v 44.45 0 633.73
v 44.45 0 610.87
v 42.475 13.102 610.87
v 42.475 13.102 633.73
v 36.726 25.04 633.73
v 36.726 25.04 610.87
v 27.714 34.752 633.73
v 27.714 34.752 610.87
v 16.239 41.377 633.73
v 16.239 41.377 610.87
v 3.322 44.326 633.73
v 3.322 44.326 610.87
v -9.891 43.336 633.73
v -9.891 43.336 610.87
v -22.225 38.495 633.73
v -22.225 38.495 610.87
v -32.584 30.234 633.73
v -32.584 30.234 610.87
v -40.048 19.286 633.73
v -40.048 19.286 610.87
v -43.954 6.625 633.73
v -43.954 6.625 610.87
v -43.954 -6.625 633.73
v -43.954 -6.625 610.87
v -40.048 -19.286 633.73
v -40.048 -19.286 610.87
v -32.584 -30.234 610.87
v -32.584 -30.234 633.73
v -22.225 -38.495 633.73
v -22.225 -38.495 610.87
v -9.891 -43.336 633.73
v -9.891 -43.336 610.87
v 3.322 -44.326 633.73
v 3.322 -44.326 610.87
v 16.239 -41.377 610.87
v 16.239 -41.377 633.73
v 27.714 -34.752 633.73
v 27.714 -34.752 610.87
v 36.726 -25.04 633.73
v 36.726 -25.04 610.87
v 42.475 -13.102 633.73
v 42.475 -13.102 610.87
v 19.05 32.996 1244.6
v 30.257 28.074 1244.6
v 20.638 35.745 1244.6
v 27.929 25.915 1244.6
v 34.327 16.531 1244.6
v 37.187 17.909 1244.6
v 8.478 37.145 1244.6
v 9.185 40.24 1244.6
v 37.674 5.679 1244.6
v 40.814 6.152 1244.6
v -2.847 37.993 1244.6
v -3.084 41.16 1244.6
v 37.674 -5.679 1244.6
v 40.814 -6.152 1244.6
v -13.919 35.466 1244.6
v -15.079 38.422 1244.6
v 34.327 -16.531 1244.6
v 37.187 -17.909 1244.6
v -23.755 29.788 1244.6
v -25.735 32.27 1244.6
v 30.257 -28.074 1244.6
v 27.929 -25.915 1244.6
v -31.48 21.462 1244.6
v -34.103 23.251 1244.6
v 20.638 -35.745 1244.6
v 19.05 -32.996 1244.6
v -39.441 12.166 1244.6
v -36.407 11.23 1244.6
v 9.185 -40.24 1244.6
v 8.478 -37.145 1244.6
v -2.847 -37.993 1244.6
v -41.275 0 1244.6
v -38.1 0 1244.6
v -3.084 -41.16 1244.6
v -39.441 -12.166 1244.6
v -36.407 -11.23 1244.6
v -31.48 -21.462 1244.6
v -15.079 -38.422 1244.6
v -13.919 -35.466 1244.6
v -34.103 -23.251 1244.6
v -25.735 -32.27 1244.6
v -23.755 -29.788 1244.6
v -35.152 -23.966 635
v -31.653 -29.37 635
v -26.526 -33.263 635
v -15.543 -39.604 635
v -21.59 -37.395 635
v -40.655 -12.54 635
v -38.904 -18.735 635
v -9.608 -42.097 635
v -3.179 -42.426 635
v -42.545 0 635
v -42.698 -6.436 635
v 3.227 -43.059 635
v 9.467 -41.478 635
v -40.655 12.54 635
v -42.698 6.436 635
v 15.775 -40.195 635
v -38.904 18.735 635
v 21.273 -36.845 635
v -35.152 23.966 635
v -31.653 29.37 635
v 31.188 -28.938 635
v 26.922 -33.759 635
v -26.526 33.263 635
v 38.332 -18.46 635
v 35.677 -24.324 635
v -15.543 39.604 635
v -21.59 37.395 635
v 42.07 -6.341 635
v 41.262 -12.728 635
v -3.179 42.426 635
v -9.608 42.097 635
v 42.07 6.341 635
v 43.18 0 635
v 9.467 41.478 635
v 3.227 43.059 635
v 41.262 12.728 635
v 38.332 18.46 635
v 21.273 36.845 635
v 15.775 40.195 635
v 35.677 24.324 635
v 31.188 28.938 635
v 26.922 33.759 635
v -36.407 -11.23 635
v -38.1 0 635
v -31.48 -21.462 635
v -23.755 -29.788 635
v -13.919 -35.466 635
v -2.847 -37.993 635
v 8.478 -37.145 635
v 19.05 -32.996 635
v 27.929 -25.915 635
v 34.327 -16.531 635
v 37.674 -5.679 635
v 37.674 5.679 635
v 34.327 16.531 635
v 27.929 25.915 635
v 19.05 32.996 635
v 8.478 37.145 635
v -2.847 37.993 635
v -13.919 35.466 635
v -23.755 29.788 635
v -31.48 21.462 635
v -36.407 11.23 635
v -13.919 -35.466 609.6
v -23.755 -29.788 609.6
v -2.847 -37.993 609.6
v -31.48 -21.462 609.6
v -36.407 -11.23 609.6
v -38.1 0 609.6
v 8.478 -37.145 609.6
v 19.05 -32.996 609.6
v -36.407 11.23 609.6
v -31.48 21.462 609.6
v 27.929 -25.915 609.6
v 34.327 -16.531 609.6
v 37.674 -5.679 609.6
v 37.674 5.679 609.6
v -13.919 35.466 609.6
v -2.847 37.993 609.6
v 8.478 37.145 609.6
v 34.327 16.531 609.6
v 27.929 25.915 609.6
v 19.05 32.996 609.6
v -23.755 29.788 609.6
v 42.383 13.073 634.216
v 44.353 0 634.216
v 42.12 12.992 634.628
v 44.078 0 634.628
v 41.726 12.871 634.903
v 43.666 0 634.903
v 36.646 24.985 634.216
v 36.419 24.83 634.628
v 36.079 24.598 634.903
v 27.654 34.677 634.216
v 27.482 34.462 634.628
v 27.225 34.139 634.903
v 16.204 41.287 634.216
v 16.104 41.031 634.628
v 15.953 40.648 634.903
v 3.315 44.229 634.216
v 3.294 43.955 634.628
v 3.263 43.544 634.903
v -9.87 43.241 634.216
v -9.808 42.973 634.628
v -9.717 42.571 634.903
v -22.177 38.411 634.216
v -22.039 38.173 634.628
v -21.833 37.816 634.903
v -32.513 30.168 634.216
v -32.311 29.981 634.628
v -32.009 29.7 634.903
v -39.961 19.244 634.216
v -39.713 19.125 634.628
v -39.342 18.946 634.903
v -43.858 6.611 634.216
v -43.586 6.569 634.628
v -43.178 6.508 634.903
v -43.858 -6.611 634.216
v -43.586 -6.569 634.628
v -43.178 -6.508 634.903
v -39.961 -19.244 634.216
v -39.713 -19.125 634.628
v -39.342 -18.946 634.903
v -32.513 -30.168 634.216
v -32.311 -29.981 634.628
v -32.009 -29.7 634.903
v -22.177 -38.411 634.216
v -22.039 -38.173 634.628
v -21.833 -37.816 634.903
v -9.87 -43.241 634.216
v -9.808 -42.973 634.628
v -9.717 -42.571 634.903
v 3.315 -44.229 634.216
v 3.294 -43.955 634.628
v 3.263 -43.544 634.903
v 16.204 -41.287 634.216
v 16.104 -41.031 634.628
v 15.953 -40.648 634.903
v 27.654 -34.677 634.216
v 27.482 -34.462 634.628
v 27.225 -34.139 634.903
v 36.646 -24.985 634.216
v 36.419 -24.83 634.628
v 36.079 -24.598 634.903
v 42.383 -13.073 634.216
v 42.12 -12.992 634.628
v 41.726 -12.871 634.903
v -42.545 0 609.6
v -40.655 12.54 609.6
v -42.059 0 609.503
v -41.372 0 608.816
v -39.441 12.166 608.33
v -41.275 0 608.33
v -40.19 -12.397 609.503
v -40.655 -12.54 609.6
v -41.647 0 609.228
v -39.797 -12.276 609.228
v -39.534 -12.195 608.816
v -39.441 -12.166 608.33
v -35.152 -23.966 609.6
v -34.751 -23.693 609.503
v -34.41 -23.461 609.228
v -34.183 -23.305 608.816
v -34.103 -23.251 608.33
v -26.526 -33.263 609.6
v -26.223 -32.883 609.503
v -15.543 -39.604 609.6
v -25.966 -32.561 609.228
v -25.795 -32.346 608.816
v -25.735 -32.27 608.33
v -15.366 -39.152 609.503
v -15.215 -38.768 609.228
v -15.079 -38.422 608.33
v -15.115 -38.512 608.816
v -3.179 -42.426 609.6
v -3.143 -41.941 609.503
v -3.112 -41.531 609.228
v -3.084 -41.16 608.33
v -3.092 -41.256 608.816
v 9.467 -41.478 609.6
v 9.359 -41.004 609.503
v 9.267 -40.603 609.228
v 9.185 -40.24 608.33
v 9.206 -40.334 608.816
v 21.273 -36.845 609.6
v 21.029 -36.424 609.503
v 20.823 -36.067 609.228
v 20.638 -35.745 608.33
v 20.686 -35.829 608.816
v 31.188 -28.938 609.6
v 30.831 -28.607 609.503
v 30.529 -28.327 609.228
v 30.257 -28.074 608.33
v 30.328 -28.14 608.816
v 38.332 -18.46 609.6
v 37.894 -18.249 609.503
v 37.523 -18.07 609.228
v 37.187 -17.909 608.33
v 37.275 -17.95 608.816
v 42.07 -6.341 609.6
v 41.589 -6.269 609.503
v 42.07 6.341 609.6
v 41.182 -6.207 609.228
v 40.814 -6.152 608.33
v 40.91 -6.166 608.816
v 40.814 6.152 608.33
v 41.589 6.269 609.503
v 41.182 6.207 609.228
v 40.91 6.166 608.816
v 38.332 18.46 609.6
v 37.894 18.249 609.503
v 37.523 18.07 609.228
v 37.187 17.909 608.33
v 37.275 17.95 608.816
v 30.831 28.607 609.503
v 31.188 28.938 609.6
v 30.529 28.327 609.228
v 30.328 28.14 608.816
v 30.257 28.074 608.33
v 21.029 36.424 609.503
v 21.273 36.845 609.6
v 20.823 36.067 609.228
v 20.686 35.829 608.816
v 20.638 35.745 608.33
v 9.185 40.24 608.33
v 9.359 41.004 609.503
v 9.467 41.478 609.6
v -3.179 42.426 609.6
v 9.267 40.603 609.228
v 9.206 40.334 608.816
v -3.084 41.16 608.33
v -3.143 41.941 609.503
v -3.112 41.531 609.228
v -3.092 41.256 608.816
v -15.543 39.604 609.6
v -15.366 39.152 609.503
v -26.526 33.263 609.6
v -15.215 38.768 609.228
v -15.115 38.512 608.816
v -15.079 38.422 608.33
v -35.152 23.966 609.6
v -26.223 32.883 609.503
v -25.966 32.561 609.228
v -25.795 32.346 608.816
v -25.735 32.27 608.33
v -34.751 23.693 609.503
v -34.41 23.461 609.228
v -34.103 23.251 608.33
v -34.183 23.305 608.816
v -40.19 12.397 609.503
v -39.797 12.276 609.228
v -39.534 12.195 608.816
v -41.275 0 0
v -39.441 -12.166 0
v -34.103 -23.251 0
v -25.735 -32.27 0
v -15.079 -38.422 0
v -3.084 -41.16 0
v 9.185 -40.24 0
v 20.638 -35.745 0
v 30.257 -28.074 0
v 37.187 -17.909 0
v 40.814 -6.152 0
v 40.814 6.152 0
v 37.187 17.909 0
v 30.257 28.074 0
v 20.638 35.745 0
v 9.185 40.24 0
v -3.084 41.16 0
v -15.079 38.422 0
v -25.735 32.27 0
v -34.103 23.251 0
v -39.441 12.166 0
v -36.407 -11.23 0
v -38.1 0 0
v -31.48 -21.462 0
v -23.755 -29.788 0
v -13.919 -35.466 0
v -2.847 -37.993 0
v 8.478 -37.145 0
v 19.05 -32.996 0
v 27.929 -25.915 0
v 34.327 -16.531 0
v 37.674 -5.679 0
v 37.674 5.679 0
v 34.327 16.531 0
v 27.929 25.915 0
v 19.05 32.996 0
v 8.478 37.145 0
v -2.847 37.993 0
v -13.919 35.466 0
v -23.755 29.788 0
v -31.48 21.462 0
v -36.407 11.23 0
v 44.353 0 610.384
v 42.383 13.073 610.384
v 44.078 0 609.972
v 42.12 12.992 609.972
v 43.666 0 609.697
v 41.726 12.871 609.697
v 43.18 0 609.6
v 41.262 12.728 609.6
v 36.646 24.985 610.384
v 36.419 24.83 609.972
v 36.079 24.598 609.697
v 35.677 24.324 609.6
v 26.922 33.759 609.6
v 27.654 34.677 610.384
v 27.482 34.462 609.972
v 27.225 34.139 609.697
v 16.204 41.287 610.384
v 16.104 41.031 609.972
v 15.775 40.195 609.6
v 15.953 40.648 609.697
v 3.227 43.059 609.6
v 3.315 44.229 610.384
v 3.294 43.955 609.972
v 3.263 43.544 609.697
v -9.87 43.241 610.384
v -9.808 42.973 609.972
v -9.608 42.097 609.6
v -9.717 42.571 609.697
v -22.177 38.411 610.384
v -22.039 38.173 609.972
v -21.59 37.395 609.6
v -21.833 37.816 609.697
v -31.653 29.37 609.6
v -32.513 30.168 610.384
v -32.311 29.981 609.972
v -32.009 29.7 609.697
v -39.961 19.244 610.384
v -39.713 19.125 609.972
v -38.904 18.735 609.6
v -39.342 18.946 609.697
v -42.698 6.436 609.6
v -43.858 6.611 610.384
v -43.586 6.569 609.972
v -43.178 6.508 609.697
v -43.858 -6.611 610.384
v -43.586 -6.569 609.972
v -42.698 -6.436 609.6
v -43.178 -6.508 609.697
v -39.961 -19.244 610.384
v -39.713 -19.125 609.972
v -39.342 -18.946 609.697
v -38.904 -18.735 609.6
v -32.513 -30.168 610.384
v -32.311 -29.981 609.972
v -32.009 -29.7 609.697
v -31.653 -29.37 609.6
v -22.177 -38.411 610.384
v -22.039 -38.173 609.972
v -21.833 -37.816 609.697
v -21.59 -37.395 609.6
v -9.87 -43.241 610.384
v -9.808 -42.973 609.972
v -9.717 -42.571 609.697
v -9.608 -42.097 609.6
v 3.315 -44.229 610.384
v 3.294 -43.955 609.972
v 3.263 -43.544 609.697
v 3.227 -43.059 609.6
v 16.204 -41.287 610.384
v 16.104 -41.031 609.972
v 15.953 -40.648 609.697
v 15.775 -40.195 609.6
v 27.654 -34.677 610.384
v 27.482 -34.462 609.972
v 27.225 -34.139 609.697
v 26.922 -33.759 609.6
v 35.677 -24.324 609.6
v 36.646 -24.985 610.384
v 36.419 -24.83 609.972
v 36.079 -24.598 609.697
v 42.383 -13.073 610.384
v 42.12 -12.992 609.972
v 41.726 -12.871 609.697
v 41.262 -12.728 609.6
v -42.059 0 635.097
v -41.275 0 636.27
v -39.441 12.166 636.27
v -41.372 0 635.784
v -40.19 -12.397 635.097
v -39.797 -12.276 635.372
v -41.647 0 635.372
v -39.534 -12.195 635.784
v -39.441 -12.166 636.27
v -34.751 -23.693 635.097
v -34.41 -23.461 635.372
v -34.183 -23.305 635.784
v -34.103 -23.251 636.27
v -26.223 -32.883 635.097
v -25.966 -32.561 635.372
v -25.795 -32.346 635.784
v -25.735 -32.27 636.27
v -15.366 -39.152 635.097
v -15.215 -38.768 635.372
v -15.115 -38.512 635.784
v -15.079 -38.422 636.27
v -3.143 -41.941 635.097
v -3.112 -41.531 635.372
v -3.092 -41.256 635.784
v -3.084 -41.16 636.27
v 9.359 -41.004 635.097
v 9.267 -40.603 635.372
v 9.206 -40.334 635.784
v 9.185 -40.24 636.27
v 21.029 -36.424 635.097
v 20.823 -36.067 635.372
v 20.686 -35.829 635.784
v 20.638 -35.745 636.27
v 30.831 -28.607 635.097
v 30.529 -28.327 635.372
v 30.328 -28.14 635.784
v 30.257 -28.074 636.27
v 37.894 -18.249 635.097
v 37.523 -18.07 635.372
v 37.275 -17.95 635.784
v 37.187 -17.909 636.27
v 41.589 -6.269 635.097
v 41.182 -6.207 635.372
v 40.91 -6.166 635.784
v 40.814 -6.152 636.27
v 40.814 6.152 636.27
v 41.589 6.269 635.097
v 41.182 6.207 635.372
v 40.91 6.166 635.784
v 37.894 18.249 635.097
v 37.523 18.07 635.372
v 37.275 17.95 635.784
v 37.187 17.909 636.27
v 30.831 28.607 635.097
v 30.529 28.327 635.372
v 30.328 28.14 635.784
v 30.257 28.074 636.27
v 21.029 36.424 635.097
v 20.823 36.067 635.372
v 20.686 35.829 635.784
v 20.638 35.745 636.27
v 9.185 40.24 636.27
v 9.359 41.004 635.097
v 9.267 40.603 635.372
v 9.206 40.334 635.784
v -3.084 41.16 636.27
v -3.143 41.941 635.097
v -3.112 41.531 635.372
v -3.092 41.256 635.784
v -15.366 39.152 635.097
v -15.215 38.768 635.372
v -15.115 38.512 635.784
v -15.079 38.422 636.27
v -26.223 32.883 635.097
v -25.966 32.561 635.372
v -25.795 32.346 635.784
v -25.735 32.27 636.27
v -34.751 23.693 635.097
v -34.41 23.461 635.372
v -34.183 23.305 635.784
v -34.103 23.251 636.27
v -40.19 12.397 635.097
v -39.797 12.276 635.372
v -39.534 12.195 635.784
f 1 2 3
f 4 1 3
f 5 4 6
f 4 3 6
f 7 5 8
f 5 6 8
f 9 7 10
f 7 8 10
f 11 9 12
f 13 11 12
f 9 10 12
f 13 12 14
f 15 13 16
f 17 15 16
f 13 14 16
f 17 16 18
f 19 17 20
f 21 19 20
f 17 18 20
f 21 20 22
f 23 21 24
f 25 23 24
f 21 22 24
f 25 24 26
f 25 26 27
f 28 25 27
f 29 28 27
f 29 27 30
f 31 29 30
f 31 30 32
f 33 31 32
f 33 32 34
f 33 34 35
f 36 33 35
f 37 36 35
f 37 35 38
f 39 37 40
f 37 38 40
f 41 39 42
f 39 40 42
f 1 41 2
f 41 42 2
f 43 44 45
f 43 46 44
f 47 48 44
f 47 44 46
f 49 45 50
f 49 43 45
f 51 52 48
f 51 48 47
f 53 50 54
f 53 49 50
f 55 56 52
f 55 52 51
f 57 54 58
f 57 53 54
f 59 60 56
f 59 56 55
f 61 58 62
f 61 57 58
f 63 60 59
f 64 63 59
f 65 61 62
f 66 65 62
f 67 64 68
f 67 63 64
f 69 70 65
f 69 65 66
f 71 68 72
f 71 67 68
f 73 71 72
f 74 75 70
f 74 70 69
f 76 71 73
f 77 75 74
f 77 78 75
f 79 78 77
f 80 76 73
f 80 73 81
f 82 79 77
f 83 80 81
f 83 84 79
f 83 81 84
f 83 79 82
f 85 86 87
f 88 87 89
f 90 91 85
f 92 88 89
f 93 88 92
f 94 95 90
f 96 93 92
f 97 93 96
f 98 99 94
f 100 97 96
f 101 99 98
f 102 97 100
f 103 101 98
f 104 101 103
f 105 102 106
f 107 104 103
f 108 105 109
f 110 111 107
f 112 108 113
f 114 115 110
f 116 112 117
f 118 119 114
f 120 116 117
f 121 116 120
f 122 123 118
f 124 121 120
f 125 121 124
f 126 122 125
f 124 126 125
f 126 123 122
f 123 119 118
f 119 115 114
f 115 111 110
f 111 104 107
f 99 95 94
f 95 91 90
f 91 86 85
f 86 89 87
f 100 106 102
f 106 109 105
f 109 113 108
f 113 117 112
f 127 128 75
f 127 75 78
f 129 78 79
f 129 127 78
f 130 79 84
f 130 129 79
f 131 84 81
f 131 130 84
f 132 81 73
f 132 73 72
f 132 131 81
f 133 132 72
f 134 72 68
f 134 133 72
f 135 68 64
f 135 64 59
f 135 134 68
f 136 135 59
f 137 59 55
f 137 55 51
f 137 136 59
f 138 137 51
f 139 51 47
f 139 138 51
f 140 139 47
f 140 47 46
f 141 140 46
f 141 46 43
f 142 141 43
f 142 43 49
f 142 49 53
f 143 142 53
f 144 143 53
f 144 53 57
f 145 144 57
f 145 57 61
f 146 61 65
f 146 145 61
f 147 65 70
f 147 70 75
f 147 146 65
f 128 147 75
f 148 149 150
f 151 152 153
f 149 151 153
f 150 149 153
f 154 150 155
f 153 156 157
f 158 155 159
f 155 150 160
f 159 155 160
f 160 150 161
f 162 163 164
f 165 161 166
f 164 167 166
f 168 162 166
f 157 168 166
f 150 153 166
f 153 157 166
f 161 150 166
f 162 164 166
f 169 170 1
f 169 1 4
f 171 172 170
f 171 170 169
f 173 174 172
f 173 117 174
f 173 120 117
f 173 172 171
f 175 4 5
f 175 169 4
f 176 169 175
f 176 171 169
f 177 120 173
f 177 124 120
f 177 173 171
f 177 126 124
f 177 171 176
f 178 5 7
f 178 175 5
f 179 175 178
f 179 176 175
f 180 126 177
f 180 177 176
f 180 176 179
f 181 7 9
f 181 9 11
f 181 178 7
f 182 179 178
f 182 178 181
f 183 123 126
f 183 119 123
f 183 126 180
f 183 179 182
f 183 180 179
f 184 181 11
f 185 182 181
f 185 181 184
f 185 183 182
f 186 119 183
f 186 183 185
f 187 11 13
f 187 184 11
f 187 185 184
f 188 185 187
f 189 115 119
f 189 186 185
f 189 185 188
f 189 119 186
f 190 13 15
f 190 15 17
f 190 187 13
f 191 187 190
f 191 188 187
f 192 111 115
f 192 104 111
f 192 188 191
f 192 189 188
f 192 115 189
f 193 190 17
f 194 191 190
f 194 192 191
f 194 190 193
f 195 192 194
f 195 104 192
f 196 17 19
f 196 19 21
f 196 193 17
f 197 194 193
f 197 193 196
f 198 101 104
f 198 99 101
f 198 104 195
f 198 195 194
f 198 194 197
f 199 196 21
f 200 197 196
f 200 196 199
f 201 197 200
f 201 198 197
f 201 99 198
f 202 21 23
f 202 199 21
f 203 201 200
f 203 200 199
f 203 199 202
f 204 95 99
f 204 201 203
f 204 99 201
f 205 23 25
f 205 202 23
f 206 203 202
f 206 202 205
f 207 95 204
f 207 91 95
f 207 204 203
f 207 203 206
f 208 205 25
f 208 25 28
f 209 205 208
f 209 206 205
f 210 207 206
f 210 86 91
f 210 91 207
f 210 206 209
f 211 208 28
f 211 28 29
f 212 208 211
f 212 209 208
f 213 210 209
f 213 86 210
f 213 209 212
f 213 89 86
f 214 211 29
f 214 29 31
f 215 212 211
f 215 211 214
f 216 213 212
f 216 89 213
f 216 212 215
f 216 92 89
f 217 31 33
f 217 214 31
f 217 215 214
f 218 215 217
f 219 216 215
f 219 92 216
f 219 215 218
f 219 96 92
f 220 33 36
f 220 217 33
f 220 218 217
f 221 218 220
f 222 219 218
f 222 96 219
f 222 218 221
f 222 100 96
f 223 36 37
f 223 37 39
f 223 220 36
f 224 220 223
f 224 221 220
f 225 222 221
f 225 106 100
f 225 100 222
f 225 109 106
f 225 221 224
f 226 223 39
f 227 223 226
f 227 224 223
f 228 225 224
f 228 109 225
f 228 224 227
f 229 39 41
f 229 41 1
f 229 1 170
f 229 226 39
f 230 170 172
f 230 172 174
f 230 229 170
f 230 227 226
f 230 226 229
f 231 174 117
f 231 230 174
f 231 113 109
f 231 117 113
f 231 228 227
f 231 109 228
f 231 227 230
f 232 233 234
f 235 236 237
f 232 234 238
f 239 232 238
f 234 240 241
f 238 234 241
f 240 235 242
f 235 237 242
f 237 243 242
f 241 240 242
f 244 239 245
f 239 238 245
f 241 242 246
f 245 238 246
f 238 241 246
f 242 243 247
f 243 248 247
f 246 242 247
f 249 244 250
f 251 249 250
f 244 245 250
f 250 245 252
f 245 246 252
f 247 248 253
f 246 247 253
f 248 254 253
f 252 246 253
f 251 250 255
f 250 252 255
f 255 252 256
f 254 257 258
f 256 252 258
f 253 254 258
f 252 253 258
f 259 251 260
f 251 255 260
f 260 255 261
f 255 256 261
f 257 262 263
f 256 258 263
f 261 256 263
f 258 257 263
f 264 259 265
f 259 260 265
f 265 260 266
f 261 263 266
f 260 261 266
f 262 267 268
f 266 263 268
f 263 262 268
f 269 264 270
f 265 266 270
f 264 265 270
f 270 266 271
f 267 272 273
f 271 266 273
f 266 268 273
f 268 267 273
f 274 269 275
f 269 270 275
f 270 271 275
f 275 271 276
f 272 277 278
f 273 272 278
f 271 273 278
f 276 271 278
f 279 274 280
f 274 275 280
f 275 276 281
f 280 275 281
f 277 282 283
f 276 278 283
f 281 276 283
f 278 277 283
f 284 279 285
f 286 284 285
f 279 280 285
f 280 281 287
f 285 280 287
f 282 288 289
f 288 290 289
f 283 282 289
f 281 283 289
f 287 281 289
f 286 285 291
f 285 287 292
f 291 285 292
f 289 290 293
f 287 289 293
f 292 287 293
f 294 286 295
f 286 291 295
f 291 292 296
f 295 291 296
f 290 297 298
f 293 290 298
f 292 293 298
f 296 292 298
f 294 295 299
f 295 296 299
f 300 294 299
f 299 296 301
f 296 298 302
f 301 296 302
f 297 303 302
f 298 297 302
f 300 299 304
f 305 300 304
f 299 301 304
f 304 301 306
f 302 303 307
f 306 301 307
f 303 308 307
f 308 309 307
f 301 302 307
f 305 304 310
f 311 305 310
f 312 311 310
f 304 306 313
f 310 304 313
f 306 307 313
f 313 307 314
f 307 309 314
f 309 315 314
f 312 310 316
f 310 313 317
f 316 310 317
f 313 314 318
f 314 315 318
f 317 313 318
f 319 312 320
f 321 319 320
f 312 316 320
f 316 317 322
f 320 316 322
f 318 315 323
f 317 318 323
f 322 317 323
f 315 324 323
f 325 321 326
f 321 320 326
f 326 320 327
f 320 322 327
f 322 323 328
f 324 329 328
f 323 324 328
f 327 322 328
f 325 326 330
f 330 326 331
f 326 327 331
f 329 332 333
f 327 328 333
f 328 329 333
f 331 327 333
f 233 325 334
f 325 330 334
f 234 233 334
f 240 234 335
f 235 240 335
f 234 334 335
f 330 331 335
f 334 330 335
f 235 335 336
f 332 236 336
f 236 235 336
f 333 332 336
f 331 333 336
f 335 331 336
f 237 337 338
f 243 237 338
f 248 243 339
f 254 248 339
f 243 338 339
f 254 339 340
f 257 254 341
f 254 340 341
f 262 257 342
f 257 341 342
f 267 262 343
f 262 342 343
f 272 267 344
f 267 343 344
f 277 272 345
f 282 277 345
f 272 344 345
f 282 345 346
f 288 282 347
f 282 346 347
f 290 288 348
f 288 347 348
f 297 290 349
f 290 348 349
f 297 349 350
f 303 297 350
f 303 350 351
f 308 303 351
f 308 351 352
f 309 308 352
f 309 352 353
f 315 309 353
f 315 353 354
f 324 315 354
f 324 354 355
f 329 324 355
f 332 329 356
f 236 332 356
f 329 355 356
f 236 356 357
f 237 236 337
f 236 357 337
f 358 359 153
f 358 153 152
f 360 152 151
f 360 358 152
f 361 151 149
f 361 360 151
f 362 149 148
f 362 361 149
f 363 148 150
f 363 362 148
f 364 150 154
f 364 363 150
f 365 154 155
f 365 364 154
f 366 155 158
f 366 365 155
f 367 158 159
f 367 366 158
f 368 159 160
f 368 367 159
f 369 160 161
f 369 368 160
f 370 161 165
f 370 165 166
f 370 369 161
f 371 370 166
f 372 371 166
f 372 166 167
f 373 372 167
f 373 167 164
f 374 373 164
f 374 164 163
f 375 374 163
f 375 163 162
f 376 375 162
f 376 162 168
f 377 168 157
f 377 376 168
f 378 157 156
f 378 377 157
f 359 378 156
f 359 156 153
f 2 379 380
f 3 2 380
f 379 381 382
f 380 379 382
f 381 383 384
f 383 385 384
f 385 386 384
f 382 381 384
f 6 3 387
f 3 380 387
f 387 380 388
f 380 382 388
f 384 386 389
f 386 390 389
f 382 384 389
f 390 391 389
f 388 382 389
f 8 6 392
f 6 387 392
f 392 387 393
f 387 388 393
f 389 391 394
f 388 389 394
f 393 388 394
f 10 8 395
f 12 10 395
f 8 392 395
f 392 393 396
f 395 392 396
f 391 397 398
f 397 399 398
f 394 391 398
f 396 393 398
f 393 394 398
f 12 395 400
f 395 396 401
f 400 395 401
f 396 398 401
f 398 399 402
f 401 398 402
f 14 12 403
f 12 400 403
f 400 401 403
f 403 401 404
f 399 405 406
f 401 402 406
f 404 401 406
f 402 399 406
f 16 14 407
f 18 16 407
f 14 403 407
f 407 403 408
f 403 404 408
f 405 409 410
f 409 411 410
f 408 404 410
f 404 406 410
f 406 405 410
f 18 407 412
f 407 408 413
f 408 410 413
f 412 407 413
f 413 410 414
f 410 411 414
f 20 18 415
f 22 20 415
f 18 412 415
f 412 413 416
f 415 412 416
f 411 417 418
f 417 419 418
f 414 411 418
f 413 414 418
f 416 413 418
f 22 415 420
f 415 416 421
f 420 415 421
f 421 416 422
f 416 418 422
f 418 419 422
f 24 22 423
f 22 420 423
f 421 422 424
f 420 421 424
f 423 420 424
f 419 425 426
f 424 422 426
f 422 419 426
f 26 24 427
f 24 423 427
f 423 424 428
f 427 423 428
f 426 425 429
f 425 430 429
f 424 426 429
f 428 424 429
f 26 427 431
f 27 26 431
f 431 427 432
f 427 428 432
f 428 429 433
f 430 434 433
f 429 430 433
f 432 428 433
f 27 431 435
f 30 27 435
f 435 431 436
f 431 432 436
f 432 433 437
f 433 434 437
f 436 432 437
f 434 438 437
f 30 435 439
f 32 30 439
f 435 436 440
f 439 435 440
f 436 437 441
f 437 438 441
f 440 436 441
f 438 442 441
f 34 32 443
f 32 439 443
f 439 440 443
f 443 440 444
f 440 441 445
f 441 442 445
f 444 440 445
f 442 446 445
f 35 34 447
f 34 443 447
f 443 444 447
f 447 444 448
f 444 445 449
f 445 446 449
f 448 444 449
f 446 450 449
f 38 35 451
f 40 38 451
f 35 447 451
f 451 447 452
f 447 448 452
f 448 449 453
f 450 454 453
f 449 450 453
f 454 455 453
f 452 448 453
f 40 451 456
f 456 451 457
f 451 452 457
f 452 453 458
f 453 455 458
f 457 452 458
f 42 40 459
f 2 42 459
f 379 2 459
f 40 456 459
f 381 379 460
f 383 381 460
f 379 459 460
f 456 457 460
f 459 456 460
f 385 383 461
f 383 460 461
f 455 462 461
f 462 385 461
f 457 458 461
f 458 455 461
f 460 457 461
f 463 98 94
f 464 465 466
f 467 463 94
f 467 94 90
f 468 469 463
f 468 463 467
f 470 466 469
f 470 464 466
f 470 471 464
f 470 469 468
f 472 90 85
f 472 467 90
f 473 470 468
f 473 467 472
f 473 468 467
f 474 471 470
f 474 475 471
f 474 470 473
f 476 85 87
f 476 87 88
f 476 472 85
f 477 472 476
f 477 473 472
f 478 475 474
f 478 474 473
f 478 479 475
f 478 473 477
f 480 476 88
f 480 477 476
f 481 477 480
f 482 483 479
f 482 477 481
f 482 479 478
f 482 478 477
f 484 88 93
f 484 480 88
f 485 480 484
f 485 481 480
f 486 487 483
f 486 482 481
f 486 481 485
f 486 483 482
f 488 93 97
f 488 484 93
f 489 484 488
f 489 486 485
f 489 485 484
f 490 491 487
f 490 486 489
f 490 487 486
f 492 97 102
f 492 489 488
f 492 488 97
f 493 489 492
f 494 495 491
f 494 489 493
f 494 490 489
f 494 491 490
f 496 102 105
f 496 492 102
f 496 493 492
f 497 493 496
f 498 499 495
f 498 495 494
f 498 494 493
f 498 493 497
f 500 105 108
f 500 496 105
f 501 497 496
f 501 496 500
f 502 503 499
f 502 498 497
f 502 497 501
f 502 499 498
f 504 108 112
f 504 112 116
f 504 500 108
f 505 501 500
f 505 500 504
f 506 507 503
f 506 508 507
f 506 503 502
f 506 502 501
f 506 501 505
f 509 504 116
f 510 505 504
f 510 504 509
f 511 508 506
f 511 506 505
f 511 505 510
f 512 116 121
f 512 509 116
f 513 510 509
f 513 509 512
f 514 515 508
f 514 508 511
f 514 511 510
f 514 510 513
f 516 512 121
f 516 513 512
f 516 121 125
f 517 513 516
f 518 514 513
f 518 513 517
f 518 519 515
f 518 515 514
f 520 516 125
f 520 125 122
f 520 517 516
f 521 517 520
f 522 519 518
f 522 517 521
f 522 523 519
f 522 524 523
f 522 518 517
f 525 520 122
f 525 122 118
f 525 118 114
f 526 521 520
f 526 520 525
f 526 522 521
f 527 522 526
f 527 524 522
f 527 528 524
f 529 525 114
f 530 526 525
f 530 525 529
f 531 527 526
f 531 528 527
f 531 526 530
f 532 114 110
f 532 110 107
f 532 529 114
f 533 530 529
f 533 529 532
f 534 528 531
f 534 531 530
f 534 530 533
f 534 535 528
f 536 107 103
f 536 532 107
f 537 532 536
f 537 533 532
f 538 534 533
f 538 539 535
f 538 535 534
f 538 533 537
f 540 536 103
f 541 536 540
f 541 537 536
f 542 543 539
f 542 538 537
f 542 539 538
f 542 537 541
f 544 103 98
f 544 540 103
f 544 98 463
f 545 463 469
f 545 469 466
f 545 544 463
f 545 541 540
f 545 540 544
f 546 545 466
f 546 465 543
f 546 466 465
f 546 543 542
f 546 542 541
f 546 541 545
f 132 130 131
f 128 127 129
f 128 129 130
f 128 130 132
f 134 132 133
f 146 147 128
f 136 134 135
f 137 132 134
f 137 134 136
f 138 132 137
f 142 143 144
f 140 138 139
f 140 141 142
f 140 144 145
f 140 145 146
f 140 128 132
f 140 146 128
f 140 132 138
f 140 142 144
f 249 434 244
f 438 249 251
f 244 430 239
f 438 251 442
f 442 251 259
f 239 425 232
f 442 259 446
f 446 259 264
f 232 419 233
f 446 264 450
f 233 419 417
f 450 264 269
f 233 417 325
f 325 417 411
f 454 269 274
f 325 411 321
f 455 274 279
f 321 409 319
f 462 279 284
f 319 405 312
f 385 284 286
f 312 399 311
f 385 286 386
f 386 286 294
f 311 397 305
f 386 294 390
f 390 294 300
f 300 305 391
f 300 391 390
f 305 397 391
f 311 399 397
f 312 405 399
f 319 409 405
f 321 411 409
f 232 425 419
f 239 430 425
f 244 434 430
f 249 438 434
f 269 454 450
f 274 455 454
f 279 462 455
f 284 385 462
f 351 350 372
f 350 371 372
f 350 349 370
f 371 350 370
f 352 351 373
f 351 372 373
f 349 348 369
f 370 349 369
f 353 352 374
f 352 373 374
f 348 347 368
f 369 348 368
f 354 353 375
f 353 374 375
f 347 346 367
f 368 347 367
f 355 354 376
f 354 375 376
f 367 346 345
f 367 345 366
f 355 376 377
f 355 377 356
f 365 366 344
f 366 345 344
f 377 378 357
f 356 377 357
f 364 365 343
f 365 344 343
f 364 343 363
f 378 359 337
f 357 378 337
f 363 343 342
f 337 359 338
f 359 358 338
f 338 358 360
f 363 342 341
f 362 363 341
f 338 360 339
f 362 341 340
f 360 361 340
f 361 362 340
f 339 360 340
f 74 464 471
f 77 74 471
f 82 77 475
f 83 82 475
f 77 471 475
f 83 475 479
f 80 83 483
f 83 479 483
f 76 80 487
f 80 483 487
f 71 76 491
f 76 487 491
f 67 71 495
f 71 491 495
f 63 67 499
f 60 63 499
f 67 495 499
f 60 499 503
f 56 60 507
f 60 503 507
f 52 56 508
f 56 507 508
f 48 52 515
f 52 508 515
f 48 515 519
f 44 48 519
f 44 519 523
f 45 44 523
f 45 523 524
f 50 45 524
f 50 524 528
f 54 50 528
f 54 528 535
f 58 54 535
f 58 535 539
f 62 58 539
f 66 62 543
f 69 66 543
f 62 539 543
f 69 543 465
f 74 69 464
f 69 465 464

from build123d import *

# Parameters (mm, degrees)
SKETCH1_R           = 41.275
SKETCH1_R_2         = 38.1
BOSS_EXTRUDE1_DEPTH = 609.6
SKETCH3_R           = 44.45
BOSS_EXTRUDE2_DEPTH = 25.4
SKETCH5_R           = 41.275
SKETCH5_R_2         = 38.1
BOSS_EXTRUDE4_DEPTH = 609.6
FILLET1_R           = 1.27


with BuildPart() as part:
    # Sketch1 → Boss-Extrude1 (new body)
    with BuildSketch(Plane.XY):
        with Locations(Location((0, 0, 0), (0, 0, 180))):
            Circle(SKETCH1_R)
        with Locations(Location((0, 0, 0), (0, 0, 180))):
            Circle(SKETCH1_R_2, mode=Mode.SUBTRACT)
    extrude(amount=BOSS_EXTRUDE1_DEPTH)

    # Sketch3 → Boss-Extrude2 (add)
    with BuildSketch(Plane.XY.offset(609.6)):
        Circle(SKETCH3_R)
    extrude(amount=BOSS_EXTRUDE2_DEPTH)

    # Sketch5 → Boss-Extrude4 (add)
    with BuildSketch(Plane.XY.offset(635)):
        with Locations(Location((0, 0, 0), (0, 0, 180))):
            Circle(SKETCH5_R)
        with Locations(Location((0, 0, 0), (0, 0, 180))):
            Circle(SKETCH5_R_2, mode=Mode.SUBTRACT)
    extrude(amount=BOSS_EXTRUDE4_DEPTH)

    # Fillet1
    fillet1_edges = [part.edges().sort_by_distance(p)[0] for p in [
        (-44.45, 0, 609.6),
        (-44.45, 0, 635),
        (41.275, 0, 635),
        (41.275, 0, 609.6),
    ]]
    fillet(fillet1_edges, radius=FILLET1_R)


solid = part.part
